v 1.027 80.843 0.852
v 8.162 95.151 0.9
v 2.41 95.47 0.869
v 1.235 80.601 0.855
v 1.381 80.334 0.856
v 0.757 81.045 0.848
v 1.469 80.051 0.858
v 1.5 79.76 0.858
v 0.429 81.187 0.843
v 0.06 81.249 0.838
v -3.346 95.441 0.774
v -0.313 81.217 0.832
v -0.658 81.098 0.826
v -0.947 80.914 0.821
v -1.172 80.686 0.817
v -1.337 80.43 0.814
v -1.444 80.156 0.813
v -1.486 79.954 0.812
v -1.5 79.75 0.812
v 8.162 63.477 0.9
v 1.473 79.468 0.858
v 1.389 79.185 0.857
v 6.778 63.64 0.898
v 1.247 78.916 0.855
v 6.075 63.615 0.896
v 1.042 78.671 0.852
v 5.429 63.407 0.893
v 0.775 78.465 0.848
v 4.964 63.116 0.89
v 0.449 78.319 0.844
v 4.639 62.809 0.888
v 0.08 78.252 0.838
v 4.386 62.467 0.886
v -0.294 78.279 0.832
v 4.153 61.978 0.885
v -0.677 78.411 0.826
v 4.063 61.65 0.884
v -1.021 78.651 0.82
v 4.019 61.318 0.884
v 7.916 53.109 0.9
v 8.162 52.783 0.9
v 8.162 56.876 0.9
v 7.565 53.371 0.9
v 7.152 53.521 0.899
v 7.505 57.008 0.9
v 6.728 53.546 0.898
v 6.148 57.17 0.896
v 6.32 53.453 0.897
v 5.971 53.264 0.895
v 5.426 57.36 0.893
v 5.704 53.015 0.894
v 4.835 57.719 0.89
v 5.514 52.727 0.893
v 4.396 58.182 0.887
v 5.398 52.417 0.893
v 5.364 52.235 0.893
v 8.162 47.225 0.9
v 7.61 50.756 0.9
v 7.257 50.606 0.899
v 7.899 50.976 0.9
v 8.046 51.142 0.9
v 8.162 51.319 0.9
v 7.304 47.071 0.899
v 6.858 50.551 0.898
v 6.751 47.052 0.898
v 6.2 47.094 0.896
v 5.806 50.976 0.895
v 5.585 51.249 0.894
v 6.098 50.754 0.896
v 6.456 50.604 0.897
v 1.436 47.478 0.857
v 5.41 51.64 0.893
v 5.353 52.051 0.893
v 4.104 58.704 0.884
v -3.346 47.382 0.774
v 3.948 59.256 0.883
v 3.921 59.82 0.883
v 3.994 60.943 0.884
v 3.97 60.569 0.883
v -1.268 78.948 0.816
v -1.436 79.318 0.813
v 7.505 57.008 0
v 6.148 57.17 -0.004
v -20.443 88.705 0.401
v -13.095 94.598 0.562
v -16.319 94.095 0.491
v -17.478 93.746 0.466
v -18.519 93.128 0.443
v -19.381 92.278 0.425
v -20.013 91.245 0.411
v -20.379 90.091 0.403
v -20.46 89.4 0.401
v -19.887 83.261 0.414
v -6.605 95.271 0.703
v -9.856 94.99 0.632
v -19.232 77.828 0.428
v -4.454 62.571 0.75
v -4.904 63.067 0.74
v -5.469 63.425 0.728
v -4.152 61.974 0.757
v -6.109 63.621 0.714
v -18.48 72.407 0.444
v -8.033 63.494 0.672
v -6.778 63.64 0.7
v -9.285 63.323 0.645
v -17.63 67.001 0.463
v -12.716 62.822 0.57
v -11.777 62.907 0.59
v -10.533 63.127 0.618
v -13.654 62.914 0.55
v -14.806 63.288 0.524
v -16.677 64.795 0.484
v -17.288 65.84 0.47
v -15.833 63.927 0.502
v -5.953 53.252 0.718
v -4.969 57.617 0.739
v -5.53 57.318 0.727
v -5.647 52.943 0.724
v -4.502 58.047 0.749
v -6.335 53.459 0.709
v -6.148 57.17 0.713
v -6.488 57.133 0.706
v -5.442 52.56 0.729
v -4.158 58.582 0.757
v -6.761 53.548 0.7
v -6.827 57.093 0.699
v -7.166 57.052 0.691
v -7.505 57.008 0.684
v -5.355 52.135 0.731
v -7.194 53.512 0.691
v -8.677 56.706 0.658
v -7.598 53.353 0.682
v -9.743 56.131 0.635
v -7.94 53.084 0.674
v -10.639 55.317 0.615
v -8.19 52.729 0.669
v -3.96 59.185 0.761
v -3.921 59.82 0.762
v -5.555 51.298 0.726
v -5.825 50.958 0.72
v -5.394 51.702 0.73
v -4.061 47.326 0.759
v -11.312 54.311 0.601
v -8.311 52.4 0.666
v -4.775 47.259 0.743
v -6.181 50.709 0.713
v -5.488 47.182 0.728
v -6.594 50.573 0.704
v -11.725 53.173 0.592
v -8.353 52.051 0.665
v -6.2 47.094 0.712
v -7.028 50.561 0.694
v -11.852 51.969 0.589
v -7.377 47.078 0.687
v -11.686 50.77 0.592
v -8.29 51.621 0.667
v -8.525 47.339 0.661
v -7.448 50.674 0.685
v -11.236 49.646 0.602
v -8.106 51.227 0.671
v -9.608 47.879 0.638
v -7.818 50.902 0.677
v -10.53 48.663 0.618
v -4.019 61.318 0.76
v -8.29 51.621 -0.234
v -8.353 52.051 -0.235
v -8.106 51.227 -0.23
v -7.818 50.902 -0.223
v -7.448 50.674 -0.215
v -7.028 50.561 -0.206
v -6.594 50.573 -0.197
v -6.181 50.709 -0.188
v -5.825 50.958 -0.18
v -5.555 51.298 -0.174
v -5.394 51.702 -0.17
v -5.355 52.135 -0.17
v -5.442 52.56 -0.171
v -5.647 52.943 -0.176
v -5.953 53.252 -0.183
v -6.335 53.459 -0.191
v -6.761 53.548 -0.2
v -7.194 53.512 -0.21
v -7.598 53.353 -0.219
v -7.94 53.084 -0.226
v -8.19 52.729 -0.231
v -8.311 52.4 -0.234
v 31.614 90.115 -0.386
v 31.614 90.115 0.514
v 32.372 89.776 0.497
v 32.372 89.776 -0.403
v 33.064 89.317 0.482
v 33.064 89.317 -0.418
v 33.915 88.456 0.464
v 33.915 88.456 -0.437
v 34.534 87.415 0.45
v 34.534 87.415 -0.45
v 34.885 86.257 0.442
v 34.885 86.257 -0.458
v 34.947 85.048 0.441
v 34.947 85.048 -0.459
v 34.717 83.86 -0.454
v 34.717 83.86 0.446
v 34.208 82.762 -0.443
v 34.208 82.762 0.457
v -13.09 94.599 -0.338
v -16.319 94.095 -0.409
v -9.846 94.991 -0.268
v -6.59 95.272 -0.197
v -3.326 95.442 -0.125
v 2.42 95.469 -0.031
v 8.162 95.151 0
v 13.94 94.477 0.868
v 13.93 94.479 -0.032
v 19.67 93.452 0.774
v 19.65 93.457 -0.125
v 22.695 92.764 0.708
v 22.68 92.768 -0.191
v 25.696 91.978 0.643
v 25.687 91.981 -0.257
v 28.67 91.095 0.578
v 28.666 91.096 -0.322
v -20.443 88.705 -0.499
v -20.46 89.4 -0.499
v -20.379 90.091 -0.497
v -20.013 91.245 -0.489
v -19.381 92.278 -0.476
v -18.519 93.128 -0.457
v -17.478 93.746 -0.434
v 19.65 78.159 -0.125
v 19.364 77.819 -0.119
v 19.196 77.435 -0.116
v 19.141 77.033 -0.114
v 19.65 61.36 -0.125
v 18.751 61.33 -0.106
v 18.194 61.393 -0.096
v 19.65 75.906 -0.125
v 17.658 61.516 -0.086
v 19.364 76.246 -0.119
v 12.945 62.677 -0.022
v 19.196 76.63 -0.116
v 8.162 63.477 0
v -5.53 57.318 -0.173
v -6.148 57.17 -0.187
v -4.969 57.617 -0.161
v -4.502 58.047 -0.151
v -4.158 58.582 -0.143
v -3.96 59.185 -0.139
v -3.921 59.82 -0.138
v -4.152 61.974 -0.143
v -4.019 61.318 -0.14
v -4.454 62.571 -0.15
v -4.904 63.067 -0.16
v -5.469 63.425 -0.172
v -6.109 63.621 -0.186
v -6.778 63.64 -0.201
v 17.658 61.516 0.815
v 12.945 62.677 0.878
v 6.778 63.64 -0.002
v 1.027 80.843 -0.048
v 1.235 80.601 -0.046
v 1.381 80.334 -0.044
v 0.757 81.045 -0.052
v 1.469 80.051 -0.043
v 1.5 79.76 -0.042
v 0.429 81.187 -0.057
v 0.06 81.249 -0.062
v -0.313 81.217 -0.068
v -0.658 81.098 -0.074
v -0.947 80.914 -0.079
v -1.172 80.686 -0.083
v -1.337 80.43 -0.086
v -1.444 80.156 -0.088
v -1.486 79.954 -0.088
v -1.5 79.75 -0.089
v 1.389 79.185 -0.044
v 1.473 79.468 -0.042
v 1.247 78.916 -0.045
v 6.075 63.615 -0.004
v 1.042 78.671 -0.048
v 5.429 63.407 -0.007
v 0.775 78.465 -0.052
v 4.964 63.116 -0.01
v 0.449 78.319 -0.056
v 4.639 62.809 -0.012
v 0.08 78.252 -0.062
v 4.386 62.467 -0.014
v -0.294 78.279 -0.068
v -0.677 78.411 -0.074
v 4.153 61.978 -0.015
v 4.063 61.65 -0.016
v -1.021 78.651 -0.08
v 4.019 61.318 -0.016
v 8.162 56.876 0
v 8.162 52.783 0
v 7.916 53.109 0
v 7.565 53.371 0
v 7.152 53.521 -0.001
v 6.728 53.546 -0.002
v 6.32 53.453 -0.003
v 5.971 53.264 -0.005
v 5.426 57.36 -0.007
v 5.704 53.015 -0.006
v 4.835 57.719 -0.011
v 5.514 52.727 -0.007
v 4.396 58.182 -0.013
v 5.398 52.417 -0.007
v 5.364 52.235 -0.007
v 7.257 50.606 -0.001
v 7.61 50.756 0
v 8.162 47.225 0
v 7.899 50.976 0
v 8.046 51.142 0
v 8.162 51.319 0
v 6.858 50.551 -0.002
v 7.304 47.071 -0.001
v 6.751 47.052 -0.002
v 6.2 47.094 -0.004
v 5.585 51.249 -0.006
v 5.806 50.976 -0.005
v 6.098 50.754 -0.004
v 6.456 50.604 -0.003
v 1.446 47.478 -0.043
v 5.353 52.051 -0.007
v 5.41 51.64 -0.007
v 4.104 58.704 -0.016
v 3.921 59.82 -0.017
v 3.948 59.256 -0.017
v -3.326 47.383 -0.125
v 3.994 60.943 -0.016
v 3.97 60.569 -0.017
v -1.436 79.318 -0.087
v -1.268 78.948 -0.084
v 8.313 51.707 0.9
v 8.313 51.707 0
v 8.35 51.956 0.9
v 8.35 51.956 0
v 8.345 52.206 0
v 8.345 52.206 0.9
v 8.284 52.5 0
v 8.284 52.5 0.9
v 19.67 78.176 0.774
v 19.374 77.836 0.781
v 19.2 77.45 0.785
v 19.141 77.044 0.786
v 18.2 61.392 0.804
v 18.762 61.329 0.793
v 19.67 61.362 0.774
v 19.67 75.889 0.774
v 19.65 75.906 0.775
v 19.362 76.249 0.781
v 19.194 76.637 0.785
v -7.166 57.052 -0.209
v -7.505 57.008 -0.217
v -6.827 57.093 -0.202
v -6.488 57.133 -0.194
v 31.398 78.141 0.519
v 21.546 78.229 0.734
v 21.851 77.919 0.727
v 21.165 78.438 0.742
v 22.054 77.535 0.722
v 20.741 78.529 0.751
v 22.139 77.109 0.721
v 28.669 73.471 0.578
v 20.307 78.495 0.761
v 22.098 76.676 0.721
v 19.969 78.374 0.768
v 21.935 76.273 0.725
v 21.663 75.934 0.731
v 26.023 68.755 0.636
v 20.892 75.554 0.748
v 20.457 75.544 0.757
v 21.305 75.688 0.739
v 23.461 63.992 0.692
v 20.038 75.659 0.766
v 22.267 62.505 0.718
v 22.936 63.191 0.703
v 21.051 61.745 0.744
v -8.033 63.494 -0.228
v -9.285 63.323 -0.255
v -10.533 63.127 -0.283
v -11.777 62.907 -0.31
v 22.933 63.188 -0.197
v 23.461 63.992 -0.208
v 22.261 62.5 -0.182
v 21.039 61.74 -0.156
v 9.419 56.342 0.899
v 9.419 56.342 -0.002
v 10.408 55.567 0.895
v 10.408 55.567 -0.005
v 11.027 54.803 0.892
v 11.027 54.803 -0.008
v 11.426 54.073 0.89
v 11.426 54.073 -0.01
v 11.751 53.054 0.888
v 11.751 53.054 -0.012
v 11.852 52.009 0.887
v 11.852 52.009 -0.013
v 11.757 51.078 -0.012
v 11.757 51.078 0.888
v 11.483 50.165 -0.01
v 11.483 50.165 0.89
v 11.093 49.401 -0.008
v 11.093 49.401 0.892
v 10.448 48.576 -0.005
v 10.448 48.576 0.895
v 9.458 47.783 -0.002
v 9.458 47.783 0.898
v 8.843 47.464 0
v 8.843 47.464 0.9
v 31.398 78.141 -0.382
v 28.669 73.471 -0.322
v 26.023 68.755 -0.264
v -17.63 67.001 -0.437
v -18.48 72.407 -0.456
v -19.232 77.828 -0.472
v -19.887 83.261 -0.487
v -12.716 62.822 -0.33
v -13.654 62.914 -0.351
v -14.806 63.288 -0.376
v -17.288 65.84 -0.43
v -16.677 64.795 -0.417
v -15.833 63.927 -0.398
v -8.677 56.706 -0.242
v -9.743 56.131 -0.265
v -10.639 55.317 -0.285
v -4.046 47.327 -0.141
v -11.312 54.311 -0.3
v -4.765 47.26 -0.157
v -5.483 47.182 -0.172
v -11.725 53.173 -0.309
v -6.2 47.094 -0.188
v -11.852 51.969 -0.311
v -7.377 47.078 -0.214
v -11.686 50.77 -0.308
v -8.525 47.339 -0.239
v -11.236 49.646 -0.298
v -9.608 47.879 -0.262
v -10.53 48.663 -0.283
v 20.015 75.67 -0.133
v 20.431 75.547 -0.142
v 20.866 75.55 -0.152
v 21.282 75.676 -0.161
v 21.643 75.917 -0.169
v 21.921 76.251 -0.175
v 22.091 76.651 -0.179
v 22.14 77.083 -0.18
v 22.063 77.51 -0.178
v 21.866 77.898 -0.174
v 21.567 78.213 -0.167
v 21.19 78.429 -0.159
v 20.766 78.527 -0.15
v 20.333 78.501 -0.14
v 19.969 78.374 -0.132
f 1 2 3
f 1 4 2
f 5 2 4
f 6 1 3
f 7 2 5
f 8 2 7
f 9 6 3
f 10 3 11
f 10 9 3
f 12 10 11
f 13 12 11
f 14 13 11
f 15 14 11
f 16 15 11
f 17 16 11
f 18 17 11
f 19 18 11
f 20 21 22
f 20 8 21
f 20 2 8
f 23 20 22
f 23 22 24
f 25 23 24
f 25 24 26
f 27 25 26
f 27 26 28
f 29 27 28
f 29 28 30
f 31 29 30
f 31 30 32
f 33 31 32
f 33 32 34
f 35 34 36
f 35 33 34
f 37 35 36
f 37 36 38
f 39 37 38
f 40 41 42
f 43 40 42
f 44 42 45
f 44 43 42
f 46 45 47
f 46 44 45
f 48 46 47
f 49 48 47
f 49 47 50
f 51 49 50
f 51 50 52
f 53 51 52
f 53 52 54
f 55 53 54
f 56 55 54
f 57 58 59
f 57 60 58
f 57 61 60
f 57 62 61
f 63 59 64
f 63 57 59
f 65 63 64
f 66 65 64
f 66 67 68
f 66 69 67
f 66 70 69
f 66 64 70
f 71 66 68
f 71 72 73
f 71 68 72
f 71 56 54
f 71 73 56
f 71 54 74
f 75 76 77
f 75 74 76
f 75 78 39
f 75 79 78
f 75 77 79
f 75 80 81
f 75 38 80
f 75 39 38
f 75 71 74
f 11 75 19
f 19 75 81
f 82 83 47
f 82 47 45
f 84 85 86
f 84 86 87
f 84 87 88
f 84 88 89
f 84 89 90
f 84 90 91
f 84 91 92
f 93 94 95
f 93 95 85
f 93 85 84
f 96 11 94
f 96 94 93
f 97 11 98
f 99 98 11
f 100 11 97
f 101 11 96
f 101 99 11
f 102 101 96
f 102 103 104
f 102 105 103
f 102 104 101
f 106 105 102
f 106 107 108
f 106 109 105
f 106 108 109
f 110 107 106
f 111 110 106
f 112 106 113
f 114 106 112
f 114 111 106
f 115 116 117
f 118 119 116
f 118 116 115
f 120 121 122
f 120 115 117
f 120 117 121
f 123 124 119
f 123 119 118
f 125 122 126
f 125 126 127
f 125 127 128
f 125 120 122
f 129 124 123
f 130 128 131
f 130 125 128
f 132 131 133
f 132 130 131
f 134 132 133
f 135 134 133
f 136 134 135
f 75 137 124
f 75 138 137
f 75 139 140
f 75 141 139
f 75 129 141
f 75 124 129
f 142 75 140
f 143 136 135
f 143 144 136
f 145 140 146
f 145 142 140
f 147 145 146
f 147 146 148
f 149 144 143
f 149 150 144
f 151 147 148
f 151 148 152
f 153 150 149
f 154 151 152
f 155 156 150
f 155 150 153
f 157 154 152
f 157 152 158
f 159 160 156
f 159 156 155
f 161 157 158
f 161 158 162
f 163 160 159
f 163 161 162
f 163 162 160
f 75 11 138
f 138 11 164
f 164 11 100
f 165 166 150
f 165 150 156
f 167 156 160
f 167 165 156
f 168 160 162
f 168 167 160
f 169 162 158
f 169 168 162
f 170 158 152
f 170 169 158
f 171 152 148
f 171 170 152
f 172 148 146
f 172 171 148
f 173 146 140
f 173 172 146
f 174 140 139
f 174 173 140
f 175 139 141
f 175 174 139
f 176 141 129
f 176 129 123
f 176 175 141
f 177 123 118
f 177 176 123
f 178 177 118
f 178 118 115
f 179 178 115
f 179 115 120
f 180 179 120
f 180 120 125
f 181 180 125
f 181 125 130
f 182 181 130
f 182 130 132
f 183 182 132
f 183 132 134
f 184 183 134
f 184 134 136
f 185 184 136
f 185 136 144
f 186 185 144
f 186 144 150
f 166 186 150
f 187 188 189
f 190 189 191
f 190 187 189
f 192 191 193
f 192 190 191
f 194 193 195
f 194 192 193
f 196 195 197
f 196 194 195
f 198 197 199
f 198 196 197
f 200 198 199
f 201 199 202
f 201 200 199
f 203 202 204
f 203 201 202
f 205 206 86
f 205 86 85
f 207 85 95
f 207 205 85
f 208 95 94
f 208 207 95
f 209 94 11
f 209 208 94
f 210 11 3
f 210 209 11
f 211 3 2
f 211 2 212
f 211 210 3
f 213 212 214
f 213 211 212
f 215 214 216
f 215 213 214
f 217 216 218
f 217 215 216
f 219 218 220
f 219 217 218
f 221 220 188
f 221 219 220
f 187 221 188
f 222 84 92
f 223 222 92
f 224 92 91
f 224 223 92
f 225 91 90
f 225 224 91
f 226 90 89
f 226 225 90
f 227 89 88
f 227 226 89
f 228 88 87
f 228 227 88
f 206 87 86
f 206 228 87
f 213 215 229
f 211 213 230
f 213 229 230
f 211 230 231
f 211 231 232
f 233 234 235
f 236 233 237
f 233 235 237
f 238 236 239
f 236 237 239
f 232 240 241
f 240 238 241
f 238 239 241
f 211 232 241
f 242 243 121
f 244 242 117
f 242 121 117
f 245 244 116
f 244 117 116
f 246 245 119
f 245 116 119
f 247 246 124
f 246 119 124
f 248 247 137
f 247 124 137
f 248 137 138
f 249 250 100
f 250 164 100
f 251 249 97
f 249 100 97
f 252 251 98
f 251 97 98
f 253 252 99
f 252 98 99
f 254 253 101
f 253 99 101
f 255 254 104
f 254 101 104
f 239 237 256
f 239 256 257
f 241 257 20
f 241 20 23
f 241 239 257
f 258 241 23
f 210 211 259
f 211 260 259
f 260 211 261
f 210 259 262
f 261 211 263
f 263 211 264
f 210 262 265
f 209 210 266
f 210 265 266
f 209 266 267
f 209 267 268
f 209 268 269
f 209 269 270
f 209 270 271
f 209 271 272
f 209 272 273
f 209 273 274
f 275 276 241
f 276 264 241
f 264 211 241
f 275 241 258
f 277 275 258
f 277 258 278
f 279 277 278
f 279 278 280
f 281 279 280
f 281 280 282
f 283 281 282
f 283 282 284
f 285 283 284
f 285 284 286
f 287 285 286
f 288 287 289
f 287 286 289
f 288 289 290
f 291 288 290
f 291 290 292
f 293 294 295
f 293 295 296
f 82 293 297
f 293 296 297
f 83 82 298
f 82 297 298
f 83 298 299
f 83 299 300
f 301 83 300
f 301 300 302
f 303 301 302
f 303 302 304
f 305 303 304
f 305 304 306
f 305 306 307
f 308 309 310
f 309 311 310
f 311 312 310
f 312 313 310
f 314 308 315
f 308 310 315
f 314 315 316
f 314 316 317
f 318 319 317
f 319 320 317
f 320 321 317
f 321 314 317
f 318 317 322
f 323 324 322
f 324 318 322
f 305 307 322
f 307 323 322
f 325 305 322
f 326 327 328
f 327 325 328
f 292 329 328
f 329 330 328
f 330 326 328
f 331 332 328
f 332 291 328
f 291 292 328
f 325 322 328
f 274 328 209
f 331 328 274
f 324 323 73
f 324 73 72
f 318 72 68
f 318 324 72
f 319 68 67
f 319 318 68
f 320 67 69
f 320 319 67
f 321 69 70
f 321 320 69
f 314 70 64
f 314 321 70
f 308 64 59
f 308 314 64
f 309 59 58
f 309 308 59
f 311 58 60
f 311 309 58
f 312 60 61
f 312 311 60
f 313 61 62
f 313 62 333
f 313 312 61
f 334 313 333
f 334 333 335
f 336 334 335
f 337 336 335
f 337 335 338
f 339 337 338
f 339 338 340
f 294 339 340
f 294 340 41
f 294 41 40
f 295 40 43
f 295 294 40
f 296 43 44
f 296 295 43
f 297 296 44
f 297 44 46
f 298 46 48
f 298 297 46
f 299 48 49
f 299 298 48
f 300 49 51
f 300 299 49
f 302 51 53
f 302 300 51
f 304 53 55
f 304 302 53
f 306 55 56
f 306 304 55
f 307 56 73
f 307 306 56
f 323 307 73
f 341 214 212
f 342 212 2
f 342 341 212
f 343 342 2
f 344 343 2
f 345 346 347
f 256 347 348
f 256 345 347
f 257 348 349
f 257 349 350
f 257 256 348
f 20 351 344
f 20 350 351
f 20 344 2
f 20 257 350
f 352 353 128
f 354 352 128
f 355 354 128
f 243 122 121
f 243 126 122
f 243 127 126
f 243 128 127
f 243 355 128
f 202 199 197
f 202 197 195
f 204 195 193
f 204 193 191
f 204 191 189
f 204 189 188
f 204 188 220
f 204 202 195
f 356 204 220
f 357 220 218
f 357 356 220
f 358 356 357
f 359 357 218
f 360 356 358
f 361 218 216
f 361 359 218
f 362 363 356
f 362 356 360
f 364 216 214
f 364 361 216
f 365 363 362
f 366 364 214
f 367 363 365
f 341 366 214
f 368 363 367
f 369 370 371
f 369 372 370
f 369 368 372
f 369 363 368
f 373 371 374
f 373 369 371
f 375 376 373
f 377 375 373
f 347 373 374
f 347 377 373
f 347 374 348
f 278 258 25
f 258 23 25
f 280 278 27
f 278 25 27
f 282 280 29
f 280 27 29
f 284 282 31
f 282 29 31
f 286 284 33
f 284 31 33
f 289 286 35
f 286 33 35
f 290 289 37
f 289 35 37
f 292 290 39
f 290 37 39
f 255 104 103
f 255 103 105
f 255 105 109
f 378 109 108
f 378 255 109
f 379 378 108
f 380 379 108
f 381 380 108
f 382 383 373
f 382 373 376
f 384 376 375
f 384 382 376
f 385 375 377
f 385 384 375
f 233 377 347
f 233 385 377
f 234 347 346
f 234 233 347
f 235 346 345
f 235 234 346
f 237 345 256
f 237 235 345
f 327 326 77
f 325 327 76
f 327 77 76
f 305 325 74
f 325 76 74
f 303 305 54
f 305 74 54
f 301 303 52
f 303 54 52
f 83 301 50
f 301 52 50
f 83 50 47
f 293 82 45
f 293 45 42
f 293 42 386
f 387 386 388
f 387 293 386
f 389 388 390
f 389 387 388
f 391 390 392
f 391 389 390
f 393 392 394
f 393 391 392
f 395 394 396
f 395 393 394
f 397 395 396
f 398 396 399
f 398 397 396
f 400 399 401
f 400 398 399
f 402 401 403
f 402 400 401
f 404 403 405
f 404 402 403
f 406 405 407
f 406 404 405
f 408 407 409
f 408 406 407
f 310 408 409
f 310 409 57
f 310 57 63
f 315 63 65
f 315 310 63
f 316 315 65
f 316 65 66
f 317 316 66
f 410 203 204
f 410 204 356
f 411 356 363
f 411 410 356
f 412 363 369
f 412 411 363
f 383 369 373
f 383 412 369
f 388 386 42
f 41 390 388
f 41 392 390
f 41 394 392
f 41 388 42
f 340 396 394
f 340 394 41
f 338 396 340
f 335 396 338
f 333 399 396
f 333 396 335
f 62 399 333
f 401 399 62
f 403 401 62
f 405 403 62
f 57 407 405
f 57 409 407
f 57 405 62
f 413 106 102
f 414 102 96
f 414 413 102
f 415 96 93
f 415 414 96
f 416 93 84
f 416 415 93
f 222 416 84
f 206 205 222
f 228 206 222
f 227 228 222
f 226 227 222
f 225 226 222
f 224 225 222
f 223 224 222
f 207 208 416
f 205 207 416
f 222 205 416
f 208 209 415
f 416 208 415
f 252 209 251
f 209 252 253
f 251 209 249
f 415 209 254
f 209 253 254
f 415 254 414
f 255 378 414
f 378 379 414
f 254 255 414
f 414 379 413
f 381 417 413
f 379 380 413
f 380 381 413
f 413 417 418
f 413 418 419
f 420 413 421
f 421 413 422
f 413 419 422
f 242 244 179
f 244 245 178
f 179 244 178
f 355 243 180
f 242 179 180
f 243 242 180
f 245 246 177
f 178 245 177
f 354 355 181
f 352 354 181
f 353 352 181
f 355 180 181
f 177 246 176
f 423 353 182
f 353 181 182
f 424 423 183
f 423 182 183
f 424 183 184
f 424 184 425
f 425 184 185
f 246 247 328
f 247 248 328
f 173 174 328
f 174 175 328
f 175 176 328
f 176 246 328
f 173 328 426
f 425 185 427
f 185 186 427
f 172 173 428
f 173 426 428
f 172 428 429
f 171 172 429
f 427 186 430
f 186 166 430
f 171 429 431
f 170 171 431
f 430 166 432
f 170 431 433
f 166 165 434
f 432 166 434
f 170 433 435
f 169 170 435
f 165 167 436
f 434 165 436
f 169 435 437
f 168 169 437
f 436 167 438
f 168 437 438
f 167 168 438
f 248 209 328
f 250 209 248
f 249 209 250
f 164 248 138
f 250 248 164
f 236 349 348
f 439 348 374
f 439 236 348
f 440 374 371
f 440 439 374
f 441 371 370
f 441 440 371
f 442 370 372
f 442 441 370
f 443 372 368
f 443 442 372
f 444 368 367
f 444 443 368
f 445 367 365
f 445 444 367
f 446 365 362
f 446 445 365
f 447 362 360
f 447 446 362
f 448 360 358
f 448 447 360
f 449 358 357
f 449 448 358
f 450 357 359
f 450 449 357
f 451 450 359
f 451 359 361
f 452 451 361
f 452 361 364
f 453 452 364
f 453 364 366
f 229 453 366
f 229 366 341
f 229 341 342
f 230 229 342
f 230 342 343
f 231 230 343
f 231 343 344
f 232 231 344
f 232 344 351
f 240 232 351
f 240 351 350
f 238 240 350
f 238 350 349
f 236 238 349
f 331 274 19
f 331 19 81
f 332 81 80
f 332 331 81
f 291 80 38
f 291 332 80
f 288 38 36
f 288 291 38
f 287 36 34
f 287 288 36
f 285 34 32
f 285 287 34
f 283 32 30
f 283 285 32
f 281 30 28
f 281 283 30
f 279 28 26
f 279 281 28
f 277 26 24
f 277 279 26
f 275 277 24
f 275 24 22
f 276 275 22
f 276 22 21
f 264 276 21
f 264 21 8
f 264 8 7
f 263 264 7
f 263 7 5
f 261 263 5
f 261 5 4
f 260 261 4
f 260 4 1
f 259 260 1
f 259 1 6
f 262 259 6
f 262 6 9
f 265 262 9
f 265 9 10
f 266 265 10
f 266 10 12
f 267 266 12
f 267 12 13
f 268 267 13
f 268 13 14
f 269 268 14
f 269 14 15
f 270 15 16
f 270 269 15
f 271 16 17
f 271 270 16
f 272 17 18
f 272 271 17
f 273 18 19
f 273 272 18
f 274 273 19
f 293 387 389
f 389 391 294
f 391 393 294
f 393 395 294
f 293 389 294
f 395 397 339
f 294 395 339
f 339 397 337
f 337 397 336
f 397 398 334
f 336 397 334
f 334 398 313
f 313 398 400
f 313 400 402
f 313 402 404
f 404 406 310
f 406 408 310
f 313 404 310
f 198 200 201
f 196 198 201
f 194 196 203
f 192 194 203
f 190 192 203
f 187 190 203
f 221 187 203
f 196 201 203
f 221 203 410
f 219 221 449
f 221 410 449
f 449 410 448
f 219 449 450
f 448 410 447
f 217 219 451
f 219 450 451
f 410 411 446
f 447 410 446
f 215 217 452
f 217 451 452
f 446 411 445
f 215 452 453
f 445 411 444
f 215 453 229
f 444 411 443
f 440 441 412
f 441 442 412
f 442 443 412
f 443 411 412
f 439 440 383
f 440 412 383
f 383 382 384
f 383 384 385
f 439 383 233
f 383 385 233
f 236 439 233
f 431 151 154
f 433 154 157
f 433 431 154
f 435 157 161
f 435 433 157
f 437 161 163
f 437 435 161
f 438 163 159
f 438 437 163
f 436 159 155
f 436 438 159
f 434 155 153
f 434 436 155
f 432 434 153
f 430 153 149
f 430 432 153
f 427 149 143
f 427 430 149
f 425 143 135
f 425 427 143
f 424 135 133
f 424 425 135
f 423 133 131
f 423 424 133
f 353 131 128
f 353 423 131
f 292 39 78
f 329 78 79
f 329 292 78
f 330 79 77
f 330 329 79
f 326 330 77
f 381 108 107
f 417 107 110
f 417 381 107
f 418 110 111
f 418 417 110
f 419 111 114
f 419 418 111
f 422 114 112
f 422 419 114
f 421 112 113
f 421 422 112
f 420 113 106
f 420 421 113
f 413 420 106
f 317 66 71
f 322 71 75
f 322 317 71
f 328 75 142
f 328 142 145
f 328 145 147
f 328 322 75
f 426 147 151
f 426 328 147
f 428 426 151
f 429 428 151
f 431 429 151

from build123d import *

# Parameters (mm, degrees)
SKETCH9_W               = 63
SKETCH9_H               = 97
BOSS_EXTRUDE3_DEPTH     = 0.9
FLEX1_DEPTH             = 97
FLEX1_2_DEPTH           = 97
HOLES_DEPTH             = 105.800393682
HOLES_DEPTH_BACK        = 105.800393682
SKETCH10_R              = 1.5
CUT_EXTRUDE2_DEPTH      = 105.800393775
CUT_EXTRUDE2_DEPTH_BACK = 105.800393775
SKETCH11_W              = 63.006108503
SKETCH11_H              = 97
FILLET1_START           = -0.513450093
FILLET1_DEPTH           = 1.413450171
FILLET2_R               = 2.5


with BuildPart() as part:
    # Sketch9 → Boss-Extrude3 (new body)
    with BuildSketch(Plane.XY):
        with Locations((8.161949416, 48.5)):
            Rectangle(SKETCH9_W, SKETCH9_H)
    extrude(amount=BOSS_EXTRUDE3_DEPTH)

    # Flex1: read off the stored shape, not the designer's step
    # Flex1 outline → Flex1 (cut)
    with BuildSketch(Plane(origin=(0, 0, 0), x_dir=(1, 0, 0), z_dir=(0, 1, 0))):
        Polygon((39.661949416, 0), (39.657624847, 0), (39.661949416, -0.1981922), align=None)
        Polygon((-23.338050584, -0.198192162), (-23.333726016, 0), (-23.338050584, 0), align=None)
        with BuildLine():
            Line((39.661949416, -0.9), (39.661949416, -0.33823319))
            Line((39.661949416, -0.33823319), (19.669763126, -0.774464246))
            ThreePointArc((19.669763126, -0.774464246), (13.91619862, -0.868615128), (8.161949416, -0.9))
            Line((8.161949416, -0.9), (39.661949416, -0.9))
        make_face()
        with BuildLine():
            Line((-3.345864294, -0.774464246), (-23.338050584, -0.33823319))
            Line((-23.338050584, -0.33823319), (-23.338050584, -0.9))
            Line((-23.338050584, -0.9), (8.161949416, -0.9))
            ThreePointArc((8.161949416, -0.9), (2.407700212, -0.868615128), (-3.345864294, -0.774464246))
        make_face()
    extrude(amount=FLEX1_DEPTH, mode=Mode.SUBTRACT)

    # Flex1 2 outline → Flex1 2 (add)
    with BuildSketch(Plane(origin=(0, 0, 0), x_dir=(1, 0, 0), z_dir=(0, 1, 0))):
        with BuildLine():
            ThreePointArc((8.161950743, 0), (2.417518157, 0.031331319), (-3.326230898, 0.125321578))
            Line((-3.326230898, 0.125321578), (-23.321471439, 0.561619279))
            Line((-23.321471439, 0.561619279), (-23.333726016, 0))
            Line((-23.333726016, 0), (8.161950743, 0))
        make_face()
        with BuildLine():
            ThreePointArc((19.650129729, 0.125321578), (13.906382001, 0.031331334), (8.161950743, 0))
            Line((8.161950743, 0), (39.657624847, 0))
            Line((39.657624847, 0), (39.645370271, 0.561619279))
            Line((39.645370271, 0.561619279), (19.650129729, 0.125321578))
        make_face()
        Polygon((39.665003667, -0.338166546), (39.661949416, -0.1981922), (39.661949416, -0.33823319), align=None)
        Polygon((-23.338050584, -0.33823319), (-23.338050584, -0.198192162), (-23.341104836, -0.338166546), align=None)
    extrude(amount=FLEX1_2_DEPTH)

    # Sketch10 → Holes (cut, two sides: drawn at the far end of the back side and taken through both)
    with BuildSketch(Plane.XY.offset(-HOLES_DEPTH_BACK)):
        with Locations(Location((0, 79.75, 0), (0, 0, 180))):
            Circle(SKETCH10_R)
        with Locations(Location((20.640818847, 77.032584647, 0), (0, 0, 228.665080439))):
            Circle(SKETCH10_R)
        with Locations(Location((-6.852625092, 52.050855222, 0), (0, 0, 180))):
            Circle(SKETCH10_R)
        with Locations(Location((6.852625092, 52.050855222, 0), (0, 0, 180))):
            Circle(SKETCH10_R)
    extrude(amount=HOLES_DEPTH + HOLES_DEPTH_BACK, mode=Mode.SUBTRACT)

    # Sketch11 → Cut-Extrude2 (cut, two sides: drawn at the far end of the back side and taken through both)
    with BuildSketch(Plane.XY.offset(-CUT_EXTRUDE2_DEPTH_BACK)):
        with Locations((8.161949415, 48.5)):
            Rectangle(SKETCH11_W, SKETCH11_H)
        with BuildLine():
            Line((4.185800271, 63.862971087), (3.760679931, 57.376888086))
            ThreePointArc((3.760679931, 57.376888086), (5.635985569, 57.223121784), (7.505256053, 57.008079529))
            ThreePointArc((7.505256053, 57.008079529), (11.809849398, 51.398224261), (6.19999413, 47.093630915))
            ThreePointArc((6.19999413, 47.093630915), (0, 47.5), (-6.19999413, 47.093630915))
            ThreePointArc((-6.19999413, 47.093630915), (-11.809849398, 51.398224261), (-7.505256053, 57.008079529))
            ThreePointArc((-7.505256053, 57.008079529), (-5.635985569, 57.223121784), (-3.760679931, 57.376888086))
            Line((-3.760679931, 57.376888086), (-4.185800271, 63.862971087))
            ThreePointArc((-4.185800271, 63.862971087), (-10.501653038, 63.132521599), (-16.713864661, 61.779015273))
            ThreePointArc((-16.713864661, 61.779015273), (-19.180957256, 77.436335693), (-20.828588873, 93.200965046))
            ThreePointArc((-20.828588873, 93.200965046), (8.724041697, 95.100689253), (37.437803154, 87.855909847))
            ThreePointArc((37.437803154, 87.855909847), (29.127303266, 74.268784811), (21.532663784, 60.268933874))
            ThreePointArc((21.532663784, 60.268933874), (12.984187468, 62.669058361), (4.185800271, 63.862971087))
        make_face(mode=Mode.SUBTRACT)
    extrude(amount=CUT_EXTRUDE2_DEPTH + CUT_EXTRUDE2_DEPTH_BACK, mode=Mode.SUBTRACT)

    # Fillet1: read off the stored shape, not the designer's step
    # Fillet1 outline → Fillet1 (cut)
    with BuildSketch(Plane.XY.offset(FILLET1_START)):
        with BuildLine():
            ThreePointArc((-16.713864661, 61.779015273), (-14.256840633, 62.391846384), (-11.777496683, 62.906999387))
            ThreePointArc((-11.777496683, 62.906999387), (-15.563592629, 63.724516542), (-17.629773662, 67.000757185))
            ThreePointArc((-17.629773662, 67.000757185), (-17.183202347, 64.387889585), (-16.713864661, 61.779015273))
        make_face()
        with BuildLine():
            ThreePointArc((21.532663784, 60.268933874), (22.490522566, 62.133675811), (23.461092679, 63.991833391))
            ThreePointArc((23.461092679, 63.991833391), (20.999228882, 61.722888632), (17.657666024, 61.515907135))
            ThreePointArc((17.657666024, 61.515907135), (19.605081566, 60.923236756), (21.532663784, 60.268933874))
        make_face()
        with BuildLine():
            ThreePointArc((37.437803154, 87.855909847), (34.544505688, 89.033292238), (31.614250404, 90.115421385))
            ThreePointArc((31.614250404, 90.115421385), (34.674360622, 87.060431172), (34.20794214, 82.761629764))
            ThreePointArc((34.20794214, 82.761629764), (35.810360655, 85.316702623), (37.437803154, 87.855909847))
        make_face()
        with BuildLine():
            ThreePointArc((-20.828588873, 93.200965046), (-20.644293019, 90.952269753), (-20.443312617, 88.705004224))
            ThreePointArc((-20.443312617, 88.705004224), (-19.435950656, 92.207056404), (-16.319289437, 94.095328217))
            ThreePointArc((-16.319289437, 94.095328217), (-18.579321492, 93.675283895), (-20.828588873, 93.200965046))
        make_face()
    extrude(amount=FILLET1_DEPTH, mode=Mode.SUBTRACT)

    # Fillet2
    fillet2_edges = [part.edges().sort_by_distance(p)[0] for p in [
        (3.760679931, 57.376888086, 0.431623426),
        (-3.760679931, 57.376888086, 0.315305823),
        (4.185800271, 63.862971087, 0.435002027),
        (-4.185800271, 63.862971087, 0.306029665),
    ]]
    fillet(fillet2_edges, radius=FILLET2_R)


solid = part.part
